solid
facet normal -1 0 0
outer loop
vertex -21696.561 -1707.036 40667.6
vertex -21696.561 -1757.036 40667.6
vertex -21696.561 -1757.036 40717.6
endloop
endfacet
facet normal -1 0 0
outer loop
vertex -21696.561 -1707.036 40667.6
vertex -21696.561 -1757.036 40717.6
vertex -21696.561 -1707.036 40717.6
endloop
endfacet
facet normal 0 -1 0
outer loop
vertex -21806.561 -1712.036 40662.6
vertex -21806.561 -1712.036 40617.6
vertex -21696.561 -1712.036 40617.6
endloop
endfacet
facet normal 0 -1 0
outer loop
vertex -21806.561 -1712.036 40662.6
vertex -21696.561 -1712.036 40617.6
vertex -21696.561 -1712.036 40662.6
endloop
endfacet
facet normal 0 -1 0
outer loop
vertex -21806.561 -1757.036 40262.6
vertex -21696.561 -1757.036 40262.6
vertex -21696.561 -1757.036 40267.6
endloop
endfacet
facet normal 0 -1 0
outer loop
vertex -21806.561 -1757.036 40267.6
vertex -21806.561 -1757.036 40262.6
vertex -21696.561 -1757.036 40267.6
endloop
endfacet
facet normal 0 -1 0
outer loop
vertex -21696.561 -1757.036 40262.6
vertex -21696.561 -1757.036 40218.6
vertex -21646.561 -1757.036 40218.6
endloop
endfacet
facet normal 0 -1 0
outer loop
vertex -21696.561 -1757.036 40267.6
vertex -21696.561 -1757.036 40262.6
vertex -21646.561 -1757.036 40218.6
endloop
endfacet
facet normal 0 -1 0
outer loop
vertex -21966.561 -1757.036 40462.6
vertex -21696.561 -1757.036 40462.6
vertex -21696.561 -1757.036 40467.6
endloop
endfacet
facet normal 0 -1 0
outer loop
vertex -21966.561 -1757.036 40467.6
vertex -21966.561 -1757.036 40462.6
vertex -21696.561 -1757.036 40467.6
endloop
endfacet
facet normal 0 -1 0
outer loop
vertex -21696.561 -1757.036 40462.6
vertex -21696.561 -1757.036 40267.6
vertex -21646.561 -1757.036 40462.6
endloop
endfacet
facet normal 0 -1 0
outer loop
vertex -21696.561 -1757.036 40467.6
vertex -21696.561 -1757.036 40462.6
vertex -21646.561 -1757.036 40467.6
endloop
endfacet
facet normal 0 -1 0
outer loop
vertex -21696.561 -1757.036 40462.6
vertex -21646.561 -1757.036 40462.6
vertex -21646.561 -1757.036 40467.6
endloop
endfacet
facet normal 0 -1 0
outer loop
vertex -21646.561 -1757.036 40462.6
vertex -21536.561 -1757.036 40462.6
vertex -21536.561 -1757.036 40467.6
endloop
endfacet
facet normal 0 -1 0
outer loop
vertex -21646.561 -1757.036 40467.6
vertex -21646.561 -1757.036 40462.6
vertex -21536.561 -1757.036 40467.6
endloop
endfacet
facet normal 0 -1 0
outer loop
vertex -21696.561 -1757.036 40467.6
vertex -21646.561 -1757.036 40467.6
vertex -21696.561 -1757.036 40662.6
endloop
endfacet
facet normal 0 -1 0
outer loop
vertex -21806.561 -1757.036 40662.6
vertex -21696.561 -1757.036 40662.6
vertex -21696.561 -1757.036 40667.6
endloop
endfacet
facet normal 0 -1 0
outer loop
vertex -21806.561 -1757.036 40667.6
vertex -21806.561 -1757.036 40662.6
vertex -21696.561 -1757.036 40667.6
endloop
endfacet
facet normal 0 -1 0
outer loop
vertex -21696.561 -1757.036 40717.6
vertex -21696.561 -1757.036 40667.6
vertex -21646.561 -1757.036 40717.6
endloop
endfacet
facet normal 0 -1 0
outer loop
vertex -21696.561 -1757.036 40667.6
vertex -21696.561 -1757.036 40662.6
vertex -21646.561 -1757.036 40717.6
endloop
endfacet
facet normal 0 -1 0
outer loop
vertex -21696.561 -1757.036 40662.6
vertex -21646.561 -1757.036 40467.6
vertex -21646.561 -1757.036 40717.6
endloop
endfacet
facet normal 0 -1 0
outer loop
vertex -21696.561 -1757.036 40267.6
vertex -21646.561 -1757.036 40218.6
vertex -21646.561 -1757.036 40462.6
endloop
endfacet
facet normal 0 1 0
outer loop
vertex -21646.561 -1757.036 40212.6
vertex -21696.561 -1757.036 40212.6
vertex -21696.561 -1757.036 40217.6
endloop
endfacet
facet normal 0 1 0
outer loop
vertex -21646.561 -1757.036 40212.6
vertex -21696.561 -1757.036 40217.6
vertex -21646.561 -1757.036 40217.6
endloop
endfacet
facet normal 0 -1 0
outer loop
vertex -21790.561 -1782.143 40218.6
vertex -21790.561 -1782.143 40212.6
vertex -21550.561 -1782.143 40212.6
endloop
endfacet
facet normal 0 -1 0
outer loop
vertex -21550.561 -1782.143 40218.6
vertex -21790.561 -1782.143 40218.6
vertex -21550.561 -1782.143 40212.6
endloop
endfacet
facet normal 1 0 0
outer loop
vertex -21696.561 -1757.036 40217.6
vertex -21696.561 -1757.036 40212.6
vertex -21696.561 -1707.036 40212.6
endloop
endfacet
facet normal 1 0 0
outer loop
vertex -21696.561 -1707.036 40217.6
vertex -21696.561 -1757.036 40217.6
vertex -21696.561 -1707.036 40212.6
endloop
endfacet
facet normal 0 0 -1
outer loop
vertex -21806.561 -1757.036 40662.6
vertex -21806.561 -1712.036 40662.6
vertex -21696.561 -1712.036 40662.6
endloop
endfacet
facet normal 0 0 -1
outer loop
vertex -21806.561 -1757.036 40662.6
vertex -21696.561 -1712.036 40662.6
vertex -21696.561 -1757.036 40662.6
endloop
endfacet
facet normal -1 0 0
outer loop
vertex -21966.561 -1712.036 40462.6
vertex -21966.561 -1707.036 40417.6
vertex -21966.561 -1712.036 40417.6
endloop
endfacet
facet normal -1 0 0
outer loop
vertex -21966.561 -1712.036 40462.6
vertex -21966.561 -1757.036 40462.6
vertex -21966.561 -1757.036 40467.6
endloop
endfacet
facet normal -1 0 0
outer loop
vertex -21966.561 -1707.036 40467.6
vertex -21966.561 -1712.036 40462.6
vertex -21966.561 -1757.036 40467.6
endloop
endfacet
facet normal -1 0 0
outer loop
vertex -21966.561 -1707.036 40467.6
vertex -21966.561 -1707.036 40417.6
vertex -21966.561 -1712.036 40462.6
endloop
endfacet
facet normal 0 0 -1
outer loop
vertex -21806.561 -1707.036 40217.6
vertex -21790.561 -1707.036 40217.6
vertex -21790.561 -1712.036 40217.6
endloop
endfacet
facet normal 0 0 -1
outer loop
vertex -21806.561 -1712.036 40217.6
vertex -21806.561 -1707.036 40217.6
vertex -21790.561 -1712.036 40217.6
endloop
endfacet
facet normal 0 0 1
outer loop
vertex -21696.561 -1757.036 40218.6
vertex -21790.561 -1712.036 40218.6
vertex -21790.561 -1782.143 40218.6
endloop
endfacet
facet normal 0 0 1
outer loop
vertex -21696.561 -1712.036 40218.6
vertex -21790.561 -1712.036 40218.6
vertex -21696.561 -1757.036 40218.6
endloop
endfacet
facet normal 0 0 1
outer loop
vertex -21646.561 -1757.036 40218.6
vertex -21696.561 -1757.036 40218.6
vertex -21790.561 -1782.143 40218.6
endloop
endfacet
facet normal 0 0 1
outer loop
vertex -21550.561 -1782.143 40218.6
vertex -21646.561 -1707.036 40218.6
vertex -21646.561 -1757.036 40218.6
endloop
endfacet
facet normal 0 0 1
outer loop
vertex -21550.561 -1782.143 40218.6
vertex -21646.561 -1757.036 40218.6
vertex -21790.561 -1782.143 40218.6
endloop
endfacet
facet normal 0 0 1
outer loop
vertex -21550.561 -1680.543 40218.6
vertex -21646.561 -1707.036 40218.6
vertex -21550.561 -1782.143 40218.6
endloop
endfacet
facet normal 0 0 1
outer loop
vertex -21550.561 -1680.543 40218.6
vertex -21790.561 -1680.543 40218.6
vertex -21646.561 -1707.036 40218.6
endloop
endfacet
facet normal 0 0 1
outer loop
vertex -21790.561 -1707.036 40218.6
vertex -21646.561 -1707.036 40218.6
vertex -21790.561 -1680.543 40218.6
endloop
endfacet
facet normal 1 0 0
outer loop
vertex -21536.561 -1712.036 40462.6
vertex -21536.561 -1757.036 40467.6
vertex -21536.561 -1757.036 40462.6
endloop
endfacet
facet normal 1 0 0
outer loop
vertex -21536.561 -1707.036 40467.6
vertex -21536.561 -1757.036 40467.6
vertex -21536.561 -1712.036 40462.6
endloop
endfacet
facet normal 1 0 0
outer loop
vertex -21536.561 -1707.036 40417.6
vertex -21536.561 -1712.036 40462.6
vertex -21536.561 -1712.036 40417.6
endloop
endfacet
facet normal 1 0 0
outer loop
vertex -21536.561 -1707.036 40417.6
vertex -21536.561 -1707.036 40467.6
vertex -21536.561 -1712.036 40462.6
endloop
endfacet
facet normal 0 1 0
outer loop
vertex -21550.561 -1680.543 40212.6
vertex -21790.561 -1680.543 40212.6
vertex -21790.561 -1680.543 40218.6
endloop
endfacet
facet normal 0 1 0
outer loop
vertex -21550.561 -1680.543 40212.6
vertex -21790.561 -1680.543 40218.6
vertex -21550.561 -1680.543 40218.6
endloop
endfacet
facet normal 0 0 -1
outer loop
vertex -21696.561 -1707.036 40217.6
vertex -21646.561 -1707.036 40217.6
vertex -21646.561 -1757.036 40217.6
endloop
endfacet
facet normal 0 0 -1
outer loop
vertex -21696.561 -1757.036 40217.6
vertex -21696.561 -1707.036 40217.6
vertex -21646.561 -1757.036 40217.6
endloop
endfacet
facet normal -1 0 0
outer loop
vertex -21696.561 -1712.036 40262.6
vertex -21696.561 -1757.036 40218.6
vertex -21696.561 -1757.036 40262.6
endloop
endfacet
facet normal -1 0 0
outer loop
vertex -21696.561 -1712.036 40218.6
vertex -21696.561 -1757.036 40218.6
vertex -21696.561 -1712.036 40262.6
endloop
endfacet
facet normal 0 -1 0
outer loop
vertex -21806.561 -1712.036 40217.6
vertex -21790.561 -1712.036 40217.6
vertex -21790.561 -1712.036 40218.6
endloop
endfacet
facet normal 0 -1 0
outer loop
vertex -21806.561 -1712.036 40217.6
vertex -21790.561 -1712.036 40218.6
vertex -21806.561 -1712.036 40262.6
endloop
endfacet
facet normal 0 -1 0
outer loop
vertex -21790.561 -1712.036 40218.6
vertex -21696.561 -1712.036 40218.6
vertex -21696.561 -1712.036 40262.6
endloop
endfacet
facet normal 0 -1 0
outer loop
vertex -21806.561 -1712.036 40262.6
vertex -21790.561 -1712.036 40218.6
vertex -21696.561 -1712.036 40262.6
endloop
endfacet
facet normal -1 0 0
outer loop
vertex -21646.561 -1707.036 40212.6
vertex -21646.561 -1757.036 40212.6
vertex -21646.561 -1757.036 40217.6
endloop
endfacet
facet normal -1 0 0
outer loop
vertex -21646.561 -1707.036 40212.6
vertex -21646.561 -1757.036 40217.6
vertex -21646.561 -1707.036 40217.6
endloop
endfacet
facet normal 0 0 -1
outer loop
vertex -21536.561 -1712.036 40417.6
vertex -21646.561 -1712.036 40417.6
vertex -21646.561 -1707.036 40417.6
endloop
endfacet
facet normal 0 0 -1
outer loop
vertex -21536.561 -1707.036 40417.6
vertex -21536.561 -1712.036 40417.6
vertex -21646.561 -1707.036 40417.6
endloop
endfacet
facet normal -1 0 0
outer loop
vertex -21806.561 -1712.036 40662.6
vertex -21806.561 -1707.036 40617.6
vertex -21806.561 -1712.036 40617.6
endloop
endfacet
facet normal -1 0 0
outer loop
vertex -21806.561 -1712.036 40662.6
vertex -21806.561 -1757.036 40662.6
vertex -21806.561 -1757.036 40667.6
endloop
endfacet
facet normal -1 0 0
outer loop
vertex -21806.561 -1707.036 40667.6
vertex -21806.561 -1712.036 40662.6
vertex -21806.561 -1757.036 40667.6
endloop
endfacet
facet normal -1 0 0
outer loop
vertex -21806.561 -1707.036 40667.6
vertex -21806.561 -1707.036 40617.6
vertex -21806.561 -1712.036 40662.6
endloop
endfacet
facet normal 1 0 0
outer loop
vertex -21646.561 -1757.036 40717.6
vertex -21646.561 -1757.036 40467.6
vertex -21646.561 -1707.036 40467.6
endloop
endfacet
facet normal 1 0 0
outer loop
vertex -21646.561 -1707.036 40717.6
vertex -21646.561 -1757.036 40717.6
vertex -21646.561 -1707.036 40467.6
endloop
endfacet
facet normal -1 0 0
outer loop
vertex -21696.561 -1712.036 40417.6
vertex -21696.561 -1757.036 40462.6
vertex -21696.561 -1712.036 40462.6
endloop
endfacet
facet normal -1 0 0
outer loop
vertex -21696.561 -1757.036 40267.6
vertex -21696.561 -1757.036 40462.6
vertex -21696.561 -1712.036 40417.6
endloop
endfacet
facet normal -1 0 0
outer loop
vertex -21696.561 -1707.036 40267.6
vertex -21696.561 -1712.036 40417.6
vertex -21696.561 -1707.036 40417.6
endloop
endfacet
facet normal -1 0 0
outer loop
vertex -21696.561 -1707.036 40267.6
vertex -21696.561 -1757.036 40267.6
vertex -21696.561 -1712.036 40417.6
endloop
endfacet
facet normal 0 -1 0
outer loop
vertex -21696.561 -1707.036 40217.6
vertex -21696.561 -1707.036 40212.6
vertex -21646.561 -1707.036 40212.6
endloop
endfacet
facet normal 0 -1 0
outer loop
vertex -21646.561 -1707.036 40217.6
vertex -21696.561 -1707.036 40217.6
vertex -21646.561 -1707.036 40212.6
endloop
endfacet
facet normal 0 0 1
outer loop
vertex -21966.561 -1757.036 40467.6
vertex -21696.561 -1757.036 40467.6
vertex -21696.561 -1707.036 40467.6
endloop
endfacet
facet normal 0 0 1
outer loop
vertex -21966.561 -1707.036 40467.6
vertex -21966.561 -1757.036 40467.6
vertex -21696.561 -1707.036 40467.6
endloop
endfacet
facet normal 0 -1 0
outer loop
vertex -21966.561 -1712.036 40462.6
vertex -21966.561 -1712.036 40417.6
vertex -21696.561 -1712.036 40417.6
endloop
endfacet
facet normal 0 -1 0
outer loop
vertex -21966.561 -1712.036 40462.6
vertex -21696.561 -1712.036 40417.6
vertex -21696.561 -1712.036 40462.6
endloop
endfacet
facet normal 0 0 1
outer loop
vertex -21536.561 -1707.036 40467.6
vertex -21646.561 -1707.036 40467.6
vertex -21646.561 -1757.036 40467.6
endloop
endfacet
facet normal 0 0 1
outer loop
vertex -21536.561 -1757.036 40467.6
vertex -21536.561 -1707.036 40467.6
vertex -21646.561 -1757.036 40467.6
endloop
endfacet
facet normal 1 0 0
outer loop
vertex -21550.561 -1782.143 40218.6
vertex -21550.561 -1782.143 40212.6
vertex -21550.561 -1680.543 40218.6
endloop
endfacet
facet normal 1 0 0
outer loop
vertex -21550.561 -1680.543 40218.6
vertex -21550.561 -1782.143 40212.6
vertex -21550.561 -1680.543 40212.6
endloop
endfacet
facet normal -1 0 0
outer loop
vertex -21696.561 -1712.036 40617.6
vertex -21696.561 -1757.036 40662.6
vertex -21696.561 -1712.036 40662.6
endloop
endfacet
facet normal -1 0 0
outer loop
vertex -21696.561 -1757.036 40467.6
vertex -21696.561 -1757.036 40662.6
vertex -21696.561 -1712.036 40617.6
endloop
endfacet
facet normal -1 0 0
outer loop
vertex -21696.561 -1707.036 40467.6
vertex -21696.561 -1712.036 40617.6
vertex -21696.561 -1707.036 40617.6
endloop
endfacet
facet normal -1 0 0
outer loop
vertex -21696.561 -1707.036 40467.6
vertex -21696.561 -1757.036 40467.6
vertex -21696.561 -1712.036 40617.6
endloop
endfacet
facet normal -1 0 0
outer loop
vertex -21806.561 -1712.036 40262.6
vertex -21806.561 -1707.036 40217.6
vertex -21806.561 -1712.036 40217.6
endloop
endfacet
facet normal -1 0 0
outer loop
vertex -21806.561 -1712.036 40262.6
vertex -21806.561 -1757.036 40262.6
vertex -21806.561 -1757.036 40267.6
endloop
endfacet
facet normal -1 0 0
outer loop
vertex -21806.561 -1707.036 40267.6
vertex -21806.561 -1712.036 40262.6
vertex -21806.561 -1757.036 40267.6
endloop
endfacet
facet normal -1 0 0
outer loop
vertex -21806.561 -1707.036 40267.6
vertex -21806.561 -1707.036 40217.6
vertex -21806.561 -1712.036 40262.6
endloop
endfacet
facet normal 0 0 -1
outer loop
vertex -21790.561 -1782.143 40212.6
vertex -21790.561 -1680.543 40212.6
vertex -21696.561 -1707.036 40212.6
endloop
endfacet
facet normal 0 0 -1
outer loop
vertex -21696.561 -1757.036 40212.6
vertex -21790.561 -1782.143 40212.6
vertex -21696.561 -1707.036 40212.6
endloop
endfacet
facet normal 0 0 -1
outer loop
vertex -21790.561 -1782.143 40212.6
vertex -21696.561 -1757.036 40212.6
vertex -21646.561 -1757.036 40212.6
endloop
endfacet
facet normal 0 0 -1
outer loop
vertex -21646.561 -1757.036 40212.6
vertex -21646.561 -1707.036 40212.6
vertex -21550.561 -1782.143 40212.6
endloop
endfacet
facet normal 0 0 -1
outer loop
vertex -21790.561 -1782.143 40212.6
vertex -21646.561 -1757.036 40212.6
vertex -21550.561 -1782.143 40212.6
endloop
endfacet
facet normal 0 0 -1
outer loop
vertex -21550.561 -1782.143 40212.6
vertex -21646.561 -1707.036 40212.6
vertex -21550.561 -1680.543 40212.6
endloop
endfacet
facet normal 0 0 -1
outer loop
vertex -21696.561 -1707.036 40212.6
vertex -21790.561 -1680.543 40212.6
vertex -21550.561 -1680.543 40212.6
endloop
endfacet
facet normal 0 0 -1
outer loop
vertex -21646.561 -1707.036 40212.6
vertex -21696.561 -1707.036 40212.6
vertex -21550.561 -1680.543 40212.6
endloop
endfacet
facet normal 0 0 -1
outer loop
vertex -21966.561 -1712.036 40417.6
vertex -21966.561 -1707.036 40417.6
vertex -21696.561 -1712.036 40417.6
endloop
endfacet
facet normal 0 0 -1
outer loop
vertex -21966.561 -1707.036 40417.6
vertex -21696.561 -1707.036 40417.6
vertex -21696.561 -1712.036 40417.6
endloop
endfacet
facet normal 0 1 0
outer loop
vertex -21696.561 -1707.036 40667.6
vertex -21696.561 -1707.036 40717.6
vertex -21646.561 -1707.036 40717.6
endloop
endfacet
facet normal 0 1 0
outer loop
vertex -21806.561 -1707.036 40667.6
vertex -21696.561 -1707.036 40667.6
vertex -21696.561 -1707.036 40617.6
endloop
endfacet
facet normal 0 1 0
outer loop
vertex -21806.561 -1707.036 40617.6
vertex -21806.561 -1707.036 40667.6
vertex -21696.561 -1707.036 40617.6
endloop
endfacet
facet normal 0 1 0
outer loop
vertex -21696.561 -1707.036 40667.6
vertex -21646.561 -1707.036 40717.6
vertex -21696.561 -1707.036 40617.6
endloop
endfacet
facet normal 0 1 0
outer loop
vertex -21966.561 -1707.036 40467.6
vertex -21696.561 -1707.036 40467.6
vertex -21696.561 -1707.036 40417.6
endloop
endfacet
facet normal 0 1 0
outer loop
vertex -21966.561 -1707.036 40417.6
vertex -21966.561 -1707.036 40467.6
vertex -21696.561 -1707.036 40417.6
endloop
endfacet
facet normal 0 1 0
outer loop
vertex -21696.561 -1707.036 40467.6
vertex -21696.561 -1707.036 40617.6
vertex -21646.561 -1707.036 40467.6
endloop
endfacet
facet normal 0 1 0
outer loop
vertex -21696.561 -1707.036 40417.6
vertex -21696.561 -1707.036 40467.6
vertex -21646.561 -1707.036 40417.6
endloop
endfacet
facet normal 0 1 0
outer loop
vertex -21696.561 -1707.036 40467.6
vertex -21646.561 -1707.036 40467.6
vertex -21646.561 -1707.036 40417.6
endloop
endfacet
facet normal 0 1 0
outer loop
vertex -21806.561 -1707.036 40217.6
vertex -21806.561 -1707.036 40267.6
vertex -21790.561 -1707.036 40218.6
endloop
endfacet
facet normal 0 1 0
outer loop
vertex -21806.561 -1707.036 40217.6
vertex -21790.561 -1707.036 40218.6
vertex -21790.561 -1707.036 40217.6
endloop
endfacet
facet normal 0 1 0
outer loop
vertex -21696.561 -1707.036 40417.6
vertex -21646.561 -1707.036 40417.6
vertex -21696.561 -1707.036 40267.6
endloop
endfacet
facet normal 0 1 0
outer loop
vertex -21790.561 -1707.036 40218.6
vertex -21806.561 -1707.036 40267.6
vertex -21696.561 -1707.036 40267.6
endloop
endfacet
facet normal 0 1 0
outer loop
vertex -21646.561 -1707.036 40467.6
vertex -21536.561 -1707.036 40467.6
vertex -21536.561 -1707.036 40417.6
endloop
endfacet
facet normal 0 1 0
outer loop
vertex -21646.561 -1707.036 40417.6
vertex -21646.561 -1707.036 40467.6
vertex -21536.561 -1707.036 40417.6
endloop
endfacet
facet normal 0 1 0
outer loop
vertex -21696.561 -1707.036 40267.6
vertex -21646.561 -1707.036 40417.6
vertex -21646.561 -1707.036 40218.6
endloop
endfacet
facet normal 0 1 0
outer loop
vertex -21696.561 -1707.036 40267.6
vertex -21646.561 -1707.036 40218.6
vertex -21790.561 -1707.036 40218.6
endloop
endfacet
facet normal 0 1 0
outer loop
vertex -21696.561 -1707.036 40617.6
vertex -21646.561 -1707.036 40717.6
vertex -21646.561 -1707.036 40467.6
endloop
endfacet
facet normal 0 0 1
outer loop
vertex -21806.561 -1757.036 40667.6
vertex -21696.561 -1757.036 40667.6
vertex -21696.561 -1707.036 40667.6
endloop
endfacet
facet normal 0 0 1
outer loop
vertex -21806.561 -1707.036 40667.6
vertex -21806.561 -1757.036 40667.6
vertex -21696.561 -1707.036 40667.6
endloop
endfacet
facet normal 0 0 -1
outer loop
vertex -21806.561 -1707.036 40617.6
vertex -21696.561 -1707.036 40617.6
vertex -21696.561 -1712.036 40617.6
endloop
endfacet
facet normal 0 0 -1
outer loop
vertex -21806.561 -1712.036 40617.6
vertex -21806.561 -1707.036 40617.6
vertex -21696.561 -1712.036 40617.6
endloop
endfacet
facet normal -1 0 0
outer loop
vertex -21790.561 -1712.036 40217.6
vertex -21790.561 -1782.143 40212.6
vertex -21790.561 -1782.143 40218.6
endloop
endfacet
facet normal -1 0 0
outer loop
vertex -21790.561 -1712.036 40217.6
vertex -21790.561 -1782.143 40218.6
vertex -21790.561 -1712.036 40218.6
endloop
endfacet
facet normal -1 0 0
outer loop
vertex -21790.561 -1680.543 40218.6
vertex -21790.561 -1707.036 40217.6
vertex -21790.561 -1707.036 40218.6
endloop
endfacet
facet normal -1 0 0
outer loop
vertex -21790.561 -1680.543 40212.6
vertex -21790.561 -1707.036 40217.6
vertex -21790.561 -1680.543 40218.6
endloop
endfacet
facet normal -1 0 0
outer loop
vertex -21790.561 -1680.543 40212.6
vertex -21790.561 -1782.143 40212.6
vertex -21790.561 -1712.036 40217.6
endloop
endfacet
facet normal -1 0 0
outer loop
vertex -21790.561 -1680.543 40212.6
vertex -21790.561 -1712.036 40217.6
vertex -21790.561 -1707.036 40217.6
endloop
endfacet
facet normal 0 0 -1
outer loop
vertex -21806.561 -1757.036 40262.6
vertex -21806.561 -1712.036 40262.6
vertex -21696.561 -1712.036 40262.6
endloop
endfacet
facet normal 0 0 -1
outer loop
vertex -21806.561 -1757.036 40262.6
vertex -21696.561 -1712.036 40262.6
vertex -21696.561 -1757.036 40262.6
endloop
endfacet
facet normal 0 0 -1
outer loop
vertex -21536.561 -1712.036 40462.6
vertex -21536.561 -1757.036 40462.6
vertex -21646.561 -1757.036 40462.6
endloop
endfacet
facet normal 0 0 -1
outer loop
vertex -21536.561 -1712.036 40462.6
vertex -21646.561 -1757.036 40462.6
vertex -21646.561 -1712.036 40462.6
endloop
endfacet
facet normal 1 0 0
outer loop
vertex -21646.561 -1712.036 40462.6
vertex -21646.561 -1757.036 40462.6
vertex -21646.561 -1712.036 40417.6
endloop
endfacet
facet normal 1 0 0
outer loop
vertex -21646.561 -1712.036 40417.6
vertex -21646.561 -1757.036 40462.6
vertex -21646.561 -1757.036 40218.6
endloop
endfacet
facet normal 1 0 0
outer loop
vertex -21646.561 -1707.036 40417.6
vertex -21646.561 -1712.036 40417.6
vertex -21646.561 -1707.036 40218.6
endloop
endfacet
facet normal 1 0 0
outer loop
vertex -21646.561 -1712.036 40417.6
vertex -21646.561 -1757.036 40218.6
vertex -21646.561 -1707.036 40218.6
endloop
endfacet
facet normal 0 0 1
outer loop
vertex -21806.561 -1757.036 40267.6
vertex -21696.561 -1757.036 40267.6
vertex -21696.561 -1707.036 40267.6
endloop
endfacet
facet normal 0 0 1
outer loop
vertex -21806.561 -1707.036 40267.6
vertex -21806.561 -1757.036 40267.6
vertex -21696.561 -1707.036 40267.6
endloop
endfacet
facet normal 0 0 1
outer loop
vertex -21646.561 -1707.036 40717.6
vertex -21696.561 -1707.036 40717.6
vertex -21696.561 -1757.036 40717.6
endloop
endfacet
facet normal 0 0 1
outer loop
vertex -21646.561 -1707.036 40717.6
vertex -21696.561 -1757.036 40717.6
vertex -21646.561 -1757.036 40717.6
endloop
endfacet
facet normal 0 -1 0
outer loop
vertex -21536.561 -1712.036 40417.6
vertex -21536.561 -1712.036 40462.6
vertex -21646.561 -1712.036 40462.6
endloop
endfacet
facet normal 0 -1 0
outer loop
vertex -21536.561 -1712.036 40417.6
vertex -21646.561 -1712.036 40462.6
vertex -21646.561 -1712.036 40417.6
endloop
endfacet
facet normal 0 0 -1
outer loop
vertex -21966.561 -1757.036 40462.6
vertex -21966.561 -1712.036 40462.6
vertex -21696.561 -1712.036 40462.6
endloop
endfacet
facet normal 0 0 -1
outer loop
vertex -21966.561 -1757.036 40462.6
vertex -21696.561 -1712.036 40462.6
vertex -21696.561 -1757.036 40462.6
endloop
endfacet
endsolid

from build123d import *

# Parameters (mm, degrees)
BOSS_EXTRUDE1_START = 5
SKETCH1_W           = 50
SKETCH1_H           = 50
BOSS_EXTRUDE1_DEPTH = 500
BOSS_EXTRUDE2_DEPTH = 110
BOSS_EXTRUDE3_DEPTH = 110
BOSS_EXTRUDE5_START = 110
BOSS_EXTRUDE5_DEPTH = 160
SKETCH1_3_W         = 240
SKETCH1_3_H         = 101.6
SKETCH1_3_W_2       = 50
SKETCH1_3_H_2       = 50
BOSS_EXTRUDE6_DEPTH = 6


with BuildPart() as part:
    # Sketch1 → Boss-Extrude1 (new body)
    with BuildSketch(Plane.XY.offset(40212.600196057).offset(BOSS_EXTRUDE1_START)):
        with Locations((-21671.561141737, -1732.035725356)):
            Rectangle(SKETCH1_W, SKETCH1_H)
    extrude(amount=BOSS_EXTRUDE1_DEPTH)

    # Sketch2 → Boss-Extrude2 (add)
    with BuildSketch(Plane(origin=(-21646.561141737, 0, 0), x_dir=(0, 0, -1), z_dir=(1, 0, 0))):
        Polygon((-40467.600196057, -1707.035725356), (-40467.600196057, -1757.035725356), (-40462.600196057, -1757.035725356), (-40462.600196057, -1712.035725356), (-40417.600196057, -1712.035725356), (-40417.600196057, -1707.035725356), align=None)
    extrude(amount=BOSS_EXTRUDE2_DEPTH)

    # Sketch3 → Boss-Extrude3 (add)
    with BuildSketch(Plane.ZY.offset(21696.561141737)):
        Polygon((40667.600196057, -1707.035725356), (40617.600196057, -1707.035725356), (40617.600196057, -1712.035725356), (40662.600196057, -1712.035725356), (40662.600196057, -1757.035725356), (40667.600196057, -1757.035725356), align=None)
        Polygon((40467.600196057, -1757.035725356), (40467.600196057, -1707.035725356), (40417.600196057, -1707.035725356), (40417.600196057, -1712.035725356), (40462.600196057, -1712.035725356), (40462.600196057, -1757.035725356), align=None)
        Polygon((40267.600196057, -1757.035725356), (40267.600196057, -1707.035725356), (40217.600196057, -1707.035725356), (40217.600196057, -1712.035725356), (40262.600196057, -1712.035725356), (40262.600196057, -1757.035725356), align=None)
    extrude(amount=BOSS_EXTRUDE3_DEPTH)

    # Sketch3<3> → Boss-Extrude5 (add)
    with BuildSketch(Plane.ZY.offset(21696.561141737).offset(BOSS_EXTRUDE5_START)):
        Polygon((40467.600196057, -1757.035725356), (40467.600196057, -1707.035725356), (40417.600196057, -1707.035725356), (40417.600196057, -1712.035725356), (40462.600196057, -1712.035725356), (40462.600196057, -1757.035725356), align=None)
    extrude(amount=BOSS_EXTRUDE5_DEPTH)

    # Sketch1<3> → Boss-Extrude6 (add)
    with BuildSketch(Plane.XY.offset(40212.600196057)):
        with Locations((-21670.561141737, -1731.342871453)):
            Rectangle(SKETCH1_3_W, SKETCH1_3_H)
        with Locations((-21671.561141737, -1732.035725356)):
            Rectangle(SKETCH1_3_W_2, SKETCH1_3_H_2, mode=Mode.SUBTRACT)
    extrude(amount=BOSS_EXTRUDE6_DEPTH)


solid = part.part
